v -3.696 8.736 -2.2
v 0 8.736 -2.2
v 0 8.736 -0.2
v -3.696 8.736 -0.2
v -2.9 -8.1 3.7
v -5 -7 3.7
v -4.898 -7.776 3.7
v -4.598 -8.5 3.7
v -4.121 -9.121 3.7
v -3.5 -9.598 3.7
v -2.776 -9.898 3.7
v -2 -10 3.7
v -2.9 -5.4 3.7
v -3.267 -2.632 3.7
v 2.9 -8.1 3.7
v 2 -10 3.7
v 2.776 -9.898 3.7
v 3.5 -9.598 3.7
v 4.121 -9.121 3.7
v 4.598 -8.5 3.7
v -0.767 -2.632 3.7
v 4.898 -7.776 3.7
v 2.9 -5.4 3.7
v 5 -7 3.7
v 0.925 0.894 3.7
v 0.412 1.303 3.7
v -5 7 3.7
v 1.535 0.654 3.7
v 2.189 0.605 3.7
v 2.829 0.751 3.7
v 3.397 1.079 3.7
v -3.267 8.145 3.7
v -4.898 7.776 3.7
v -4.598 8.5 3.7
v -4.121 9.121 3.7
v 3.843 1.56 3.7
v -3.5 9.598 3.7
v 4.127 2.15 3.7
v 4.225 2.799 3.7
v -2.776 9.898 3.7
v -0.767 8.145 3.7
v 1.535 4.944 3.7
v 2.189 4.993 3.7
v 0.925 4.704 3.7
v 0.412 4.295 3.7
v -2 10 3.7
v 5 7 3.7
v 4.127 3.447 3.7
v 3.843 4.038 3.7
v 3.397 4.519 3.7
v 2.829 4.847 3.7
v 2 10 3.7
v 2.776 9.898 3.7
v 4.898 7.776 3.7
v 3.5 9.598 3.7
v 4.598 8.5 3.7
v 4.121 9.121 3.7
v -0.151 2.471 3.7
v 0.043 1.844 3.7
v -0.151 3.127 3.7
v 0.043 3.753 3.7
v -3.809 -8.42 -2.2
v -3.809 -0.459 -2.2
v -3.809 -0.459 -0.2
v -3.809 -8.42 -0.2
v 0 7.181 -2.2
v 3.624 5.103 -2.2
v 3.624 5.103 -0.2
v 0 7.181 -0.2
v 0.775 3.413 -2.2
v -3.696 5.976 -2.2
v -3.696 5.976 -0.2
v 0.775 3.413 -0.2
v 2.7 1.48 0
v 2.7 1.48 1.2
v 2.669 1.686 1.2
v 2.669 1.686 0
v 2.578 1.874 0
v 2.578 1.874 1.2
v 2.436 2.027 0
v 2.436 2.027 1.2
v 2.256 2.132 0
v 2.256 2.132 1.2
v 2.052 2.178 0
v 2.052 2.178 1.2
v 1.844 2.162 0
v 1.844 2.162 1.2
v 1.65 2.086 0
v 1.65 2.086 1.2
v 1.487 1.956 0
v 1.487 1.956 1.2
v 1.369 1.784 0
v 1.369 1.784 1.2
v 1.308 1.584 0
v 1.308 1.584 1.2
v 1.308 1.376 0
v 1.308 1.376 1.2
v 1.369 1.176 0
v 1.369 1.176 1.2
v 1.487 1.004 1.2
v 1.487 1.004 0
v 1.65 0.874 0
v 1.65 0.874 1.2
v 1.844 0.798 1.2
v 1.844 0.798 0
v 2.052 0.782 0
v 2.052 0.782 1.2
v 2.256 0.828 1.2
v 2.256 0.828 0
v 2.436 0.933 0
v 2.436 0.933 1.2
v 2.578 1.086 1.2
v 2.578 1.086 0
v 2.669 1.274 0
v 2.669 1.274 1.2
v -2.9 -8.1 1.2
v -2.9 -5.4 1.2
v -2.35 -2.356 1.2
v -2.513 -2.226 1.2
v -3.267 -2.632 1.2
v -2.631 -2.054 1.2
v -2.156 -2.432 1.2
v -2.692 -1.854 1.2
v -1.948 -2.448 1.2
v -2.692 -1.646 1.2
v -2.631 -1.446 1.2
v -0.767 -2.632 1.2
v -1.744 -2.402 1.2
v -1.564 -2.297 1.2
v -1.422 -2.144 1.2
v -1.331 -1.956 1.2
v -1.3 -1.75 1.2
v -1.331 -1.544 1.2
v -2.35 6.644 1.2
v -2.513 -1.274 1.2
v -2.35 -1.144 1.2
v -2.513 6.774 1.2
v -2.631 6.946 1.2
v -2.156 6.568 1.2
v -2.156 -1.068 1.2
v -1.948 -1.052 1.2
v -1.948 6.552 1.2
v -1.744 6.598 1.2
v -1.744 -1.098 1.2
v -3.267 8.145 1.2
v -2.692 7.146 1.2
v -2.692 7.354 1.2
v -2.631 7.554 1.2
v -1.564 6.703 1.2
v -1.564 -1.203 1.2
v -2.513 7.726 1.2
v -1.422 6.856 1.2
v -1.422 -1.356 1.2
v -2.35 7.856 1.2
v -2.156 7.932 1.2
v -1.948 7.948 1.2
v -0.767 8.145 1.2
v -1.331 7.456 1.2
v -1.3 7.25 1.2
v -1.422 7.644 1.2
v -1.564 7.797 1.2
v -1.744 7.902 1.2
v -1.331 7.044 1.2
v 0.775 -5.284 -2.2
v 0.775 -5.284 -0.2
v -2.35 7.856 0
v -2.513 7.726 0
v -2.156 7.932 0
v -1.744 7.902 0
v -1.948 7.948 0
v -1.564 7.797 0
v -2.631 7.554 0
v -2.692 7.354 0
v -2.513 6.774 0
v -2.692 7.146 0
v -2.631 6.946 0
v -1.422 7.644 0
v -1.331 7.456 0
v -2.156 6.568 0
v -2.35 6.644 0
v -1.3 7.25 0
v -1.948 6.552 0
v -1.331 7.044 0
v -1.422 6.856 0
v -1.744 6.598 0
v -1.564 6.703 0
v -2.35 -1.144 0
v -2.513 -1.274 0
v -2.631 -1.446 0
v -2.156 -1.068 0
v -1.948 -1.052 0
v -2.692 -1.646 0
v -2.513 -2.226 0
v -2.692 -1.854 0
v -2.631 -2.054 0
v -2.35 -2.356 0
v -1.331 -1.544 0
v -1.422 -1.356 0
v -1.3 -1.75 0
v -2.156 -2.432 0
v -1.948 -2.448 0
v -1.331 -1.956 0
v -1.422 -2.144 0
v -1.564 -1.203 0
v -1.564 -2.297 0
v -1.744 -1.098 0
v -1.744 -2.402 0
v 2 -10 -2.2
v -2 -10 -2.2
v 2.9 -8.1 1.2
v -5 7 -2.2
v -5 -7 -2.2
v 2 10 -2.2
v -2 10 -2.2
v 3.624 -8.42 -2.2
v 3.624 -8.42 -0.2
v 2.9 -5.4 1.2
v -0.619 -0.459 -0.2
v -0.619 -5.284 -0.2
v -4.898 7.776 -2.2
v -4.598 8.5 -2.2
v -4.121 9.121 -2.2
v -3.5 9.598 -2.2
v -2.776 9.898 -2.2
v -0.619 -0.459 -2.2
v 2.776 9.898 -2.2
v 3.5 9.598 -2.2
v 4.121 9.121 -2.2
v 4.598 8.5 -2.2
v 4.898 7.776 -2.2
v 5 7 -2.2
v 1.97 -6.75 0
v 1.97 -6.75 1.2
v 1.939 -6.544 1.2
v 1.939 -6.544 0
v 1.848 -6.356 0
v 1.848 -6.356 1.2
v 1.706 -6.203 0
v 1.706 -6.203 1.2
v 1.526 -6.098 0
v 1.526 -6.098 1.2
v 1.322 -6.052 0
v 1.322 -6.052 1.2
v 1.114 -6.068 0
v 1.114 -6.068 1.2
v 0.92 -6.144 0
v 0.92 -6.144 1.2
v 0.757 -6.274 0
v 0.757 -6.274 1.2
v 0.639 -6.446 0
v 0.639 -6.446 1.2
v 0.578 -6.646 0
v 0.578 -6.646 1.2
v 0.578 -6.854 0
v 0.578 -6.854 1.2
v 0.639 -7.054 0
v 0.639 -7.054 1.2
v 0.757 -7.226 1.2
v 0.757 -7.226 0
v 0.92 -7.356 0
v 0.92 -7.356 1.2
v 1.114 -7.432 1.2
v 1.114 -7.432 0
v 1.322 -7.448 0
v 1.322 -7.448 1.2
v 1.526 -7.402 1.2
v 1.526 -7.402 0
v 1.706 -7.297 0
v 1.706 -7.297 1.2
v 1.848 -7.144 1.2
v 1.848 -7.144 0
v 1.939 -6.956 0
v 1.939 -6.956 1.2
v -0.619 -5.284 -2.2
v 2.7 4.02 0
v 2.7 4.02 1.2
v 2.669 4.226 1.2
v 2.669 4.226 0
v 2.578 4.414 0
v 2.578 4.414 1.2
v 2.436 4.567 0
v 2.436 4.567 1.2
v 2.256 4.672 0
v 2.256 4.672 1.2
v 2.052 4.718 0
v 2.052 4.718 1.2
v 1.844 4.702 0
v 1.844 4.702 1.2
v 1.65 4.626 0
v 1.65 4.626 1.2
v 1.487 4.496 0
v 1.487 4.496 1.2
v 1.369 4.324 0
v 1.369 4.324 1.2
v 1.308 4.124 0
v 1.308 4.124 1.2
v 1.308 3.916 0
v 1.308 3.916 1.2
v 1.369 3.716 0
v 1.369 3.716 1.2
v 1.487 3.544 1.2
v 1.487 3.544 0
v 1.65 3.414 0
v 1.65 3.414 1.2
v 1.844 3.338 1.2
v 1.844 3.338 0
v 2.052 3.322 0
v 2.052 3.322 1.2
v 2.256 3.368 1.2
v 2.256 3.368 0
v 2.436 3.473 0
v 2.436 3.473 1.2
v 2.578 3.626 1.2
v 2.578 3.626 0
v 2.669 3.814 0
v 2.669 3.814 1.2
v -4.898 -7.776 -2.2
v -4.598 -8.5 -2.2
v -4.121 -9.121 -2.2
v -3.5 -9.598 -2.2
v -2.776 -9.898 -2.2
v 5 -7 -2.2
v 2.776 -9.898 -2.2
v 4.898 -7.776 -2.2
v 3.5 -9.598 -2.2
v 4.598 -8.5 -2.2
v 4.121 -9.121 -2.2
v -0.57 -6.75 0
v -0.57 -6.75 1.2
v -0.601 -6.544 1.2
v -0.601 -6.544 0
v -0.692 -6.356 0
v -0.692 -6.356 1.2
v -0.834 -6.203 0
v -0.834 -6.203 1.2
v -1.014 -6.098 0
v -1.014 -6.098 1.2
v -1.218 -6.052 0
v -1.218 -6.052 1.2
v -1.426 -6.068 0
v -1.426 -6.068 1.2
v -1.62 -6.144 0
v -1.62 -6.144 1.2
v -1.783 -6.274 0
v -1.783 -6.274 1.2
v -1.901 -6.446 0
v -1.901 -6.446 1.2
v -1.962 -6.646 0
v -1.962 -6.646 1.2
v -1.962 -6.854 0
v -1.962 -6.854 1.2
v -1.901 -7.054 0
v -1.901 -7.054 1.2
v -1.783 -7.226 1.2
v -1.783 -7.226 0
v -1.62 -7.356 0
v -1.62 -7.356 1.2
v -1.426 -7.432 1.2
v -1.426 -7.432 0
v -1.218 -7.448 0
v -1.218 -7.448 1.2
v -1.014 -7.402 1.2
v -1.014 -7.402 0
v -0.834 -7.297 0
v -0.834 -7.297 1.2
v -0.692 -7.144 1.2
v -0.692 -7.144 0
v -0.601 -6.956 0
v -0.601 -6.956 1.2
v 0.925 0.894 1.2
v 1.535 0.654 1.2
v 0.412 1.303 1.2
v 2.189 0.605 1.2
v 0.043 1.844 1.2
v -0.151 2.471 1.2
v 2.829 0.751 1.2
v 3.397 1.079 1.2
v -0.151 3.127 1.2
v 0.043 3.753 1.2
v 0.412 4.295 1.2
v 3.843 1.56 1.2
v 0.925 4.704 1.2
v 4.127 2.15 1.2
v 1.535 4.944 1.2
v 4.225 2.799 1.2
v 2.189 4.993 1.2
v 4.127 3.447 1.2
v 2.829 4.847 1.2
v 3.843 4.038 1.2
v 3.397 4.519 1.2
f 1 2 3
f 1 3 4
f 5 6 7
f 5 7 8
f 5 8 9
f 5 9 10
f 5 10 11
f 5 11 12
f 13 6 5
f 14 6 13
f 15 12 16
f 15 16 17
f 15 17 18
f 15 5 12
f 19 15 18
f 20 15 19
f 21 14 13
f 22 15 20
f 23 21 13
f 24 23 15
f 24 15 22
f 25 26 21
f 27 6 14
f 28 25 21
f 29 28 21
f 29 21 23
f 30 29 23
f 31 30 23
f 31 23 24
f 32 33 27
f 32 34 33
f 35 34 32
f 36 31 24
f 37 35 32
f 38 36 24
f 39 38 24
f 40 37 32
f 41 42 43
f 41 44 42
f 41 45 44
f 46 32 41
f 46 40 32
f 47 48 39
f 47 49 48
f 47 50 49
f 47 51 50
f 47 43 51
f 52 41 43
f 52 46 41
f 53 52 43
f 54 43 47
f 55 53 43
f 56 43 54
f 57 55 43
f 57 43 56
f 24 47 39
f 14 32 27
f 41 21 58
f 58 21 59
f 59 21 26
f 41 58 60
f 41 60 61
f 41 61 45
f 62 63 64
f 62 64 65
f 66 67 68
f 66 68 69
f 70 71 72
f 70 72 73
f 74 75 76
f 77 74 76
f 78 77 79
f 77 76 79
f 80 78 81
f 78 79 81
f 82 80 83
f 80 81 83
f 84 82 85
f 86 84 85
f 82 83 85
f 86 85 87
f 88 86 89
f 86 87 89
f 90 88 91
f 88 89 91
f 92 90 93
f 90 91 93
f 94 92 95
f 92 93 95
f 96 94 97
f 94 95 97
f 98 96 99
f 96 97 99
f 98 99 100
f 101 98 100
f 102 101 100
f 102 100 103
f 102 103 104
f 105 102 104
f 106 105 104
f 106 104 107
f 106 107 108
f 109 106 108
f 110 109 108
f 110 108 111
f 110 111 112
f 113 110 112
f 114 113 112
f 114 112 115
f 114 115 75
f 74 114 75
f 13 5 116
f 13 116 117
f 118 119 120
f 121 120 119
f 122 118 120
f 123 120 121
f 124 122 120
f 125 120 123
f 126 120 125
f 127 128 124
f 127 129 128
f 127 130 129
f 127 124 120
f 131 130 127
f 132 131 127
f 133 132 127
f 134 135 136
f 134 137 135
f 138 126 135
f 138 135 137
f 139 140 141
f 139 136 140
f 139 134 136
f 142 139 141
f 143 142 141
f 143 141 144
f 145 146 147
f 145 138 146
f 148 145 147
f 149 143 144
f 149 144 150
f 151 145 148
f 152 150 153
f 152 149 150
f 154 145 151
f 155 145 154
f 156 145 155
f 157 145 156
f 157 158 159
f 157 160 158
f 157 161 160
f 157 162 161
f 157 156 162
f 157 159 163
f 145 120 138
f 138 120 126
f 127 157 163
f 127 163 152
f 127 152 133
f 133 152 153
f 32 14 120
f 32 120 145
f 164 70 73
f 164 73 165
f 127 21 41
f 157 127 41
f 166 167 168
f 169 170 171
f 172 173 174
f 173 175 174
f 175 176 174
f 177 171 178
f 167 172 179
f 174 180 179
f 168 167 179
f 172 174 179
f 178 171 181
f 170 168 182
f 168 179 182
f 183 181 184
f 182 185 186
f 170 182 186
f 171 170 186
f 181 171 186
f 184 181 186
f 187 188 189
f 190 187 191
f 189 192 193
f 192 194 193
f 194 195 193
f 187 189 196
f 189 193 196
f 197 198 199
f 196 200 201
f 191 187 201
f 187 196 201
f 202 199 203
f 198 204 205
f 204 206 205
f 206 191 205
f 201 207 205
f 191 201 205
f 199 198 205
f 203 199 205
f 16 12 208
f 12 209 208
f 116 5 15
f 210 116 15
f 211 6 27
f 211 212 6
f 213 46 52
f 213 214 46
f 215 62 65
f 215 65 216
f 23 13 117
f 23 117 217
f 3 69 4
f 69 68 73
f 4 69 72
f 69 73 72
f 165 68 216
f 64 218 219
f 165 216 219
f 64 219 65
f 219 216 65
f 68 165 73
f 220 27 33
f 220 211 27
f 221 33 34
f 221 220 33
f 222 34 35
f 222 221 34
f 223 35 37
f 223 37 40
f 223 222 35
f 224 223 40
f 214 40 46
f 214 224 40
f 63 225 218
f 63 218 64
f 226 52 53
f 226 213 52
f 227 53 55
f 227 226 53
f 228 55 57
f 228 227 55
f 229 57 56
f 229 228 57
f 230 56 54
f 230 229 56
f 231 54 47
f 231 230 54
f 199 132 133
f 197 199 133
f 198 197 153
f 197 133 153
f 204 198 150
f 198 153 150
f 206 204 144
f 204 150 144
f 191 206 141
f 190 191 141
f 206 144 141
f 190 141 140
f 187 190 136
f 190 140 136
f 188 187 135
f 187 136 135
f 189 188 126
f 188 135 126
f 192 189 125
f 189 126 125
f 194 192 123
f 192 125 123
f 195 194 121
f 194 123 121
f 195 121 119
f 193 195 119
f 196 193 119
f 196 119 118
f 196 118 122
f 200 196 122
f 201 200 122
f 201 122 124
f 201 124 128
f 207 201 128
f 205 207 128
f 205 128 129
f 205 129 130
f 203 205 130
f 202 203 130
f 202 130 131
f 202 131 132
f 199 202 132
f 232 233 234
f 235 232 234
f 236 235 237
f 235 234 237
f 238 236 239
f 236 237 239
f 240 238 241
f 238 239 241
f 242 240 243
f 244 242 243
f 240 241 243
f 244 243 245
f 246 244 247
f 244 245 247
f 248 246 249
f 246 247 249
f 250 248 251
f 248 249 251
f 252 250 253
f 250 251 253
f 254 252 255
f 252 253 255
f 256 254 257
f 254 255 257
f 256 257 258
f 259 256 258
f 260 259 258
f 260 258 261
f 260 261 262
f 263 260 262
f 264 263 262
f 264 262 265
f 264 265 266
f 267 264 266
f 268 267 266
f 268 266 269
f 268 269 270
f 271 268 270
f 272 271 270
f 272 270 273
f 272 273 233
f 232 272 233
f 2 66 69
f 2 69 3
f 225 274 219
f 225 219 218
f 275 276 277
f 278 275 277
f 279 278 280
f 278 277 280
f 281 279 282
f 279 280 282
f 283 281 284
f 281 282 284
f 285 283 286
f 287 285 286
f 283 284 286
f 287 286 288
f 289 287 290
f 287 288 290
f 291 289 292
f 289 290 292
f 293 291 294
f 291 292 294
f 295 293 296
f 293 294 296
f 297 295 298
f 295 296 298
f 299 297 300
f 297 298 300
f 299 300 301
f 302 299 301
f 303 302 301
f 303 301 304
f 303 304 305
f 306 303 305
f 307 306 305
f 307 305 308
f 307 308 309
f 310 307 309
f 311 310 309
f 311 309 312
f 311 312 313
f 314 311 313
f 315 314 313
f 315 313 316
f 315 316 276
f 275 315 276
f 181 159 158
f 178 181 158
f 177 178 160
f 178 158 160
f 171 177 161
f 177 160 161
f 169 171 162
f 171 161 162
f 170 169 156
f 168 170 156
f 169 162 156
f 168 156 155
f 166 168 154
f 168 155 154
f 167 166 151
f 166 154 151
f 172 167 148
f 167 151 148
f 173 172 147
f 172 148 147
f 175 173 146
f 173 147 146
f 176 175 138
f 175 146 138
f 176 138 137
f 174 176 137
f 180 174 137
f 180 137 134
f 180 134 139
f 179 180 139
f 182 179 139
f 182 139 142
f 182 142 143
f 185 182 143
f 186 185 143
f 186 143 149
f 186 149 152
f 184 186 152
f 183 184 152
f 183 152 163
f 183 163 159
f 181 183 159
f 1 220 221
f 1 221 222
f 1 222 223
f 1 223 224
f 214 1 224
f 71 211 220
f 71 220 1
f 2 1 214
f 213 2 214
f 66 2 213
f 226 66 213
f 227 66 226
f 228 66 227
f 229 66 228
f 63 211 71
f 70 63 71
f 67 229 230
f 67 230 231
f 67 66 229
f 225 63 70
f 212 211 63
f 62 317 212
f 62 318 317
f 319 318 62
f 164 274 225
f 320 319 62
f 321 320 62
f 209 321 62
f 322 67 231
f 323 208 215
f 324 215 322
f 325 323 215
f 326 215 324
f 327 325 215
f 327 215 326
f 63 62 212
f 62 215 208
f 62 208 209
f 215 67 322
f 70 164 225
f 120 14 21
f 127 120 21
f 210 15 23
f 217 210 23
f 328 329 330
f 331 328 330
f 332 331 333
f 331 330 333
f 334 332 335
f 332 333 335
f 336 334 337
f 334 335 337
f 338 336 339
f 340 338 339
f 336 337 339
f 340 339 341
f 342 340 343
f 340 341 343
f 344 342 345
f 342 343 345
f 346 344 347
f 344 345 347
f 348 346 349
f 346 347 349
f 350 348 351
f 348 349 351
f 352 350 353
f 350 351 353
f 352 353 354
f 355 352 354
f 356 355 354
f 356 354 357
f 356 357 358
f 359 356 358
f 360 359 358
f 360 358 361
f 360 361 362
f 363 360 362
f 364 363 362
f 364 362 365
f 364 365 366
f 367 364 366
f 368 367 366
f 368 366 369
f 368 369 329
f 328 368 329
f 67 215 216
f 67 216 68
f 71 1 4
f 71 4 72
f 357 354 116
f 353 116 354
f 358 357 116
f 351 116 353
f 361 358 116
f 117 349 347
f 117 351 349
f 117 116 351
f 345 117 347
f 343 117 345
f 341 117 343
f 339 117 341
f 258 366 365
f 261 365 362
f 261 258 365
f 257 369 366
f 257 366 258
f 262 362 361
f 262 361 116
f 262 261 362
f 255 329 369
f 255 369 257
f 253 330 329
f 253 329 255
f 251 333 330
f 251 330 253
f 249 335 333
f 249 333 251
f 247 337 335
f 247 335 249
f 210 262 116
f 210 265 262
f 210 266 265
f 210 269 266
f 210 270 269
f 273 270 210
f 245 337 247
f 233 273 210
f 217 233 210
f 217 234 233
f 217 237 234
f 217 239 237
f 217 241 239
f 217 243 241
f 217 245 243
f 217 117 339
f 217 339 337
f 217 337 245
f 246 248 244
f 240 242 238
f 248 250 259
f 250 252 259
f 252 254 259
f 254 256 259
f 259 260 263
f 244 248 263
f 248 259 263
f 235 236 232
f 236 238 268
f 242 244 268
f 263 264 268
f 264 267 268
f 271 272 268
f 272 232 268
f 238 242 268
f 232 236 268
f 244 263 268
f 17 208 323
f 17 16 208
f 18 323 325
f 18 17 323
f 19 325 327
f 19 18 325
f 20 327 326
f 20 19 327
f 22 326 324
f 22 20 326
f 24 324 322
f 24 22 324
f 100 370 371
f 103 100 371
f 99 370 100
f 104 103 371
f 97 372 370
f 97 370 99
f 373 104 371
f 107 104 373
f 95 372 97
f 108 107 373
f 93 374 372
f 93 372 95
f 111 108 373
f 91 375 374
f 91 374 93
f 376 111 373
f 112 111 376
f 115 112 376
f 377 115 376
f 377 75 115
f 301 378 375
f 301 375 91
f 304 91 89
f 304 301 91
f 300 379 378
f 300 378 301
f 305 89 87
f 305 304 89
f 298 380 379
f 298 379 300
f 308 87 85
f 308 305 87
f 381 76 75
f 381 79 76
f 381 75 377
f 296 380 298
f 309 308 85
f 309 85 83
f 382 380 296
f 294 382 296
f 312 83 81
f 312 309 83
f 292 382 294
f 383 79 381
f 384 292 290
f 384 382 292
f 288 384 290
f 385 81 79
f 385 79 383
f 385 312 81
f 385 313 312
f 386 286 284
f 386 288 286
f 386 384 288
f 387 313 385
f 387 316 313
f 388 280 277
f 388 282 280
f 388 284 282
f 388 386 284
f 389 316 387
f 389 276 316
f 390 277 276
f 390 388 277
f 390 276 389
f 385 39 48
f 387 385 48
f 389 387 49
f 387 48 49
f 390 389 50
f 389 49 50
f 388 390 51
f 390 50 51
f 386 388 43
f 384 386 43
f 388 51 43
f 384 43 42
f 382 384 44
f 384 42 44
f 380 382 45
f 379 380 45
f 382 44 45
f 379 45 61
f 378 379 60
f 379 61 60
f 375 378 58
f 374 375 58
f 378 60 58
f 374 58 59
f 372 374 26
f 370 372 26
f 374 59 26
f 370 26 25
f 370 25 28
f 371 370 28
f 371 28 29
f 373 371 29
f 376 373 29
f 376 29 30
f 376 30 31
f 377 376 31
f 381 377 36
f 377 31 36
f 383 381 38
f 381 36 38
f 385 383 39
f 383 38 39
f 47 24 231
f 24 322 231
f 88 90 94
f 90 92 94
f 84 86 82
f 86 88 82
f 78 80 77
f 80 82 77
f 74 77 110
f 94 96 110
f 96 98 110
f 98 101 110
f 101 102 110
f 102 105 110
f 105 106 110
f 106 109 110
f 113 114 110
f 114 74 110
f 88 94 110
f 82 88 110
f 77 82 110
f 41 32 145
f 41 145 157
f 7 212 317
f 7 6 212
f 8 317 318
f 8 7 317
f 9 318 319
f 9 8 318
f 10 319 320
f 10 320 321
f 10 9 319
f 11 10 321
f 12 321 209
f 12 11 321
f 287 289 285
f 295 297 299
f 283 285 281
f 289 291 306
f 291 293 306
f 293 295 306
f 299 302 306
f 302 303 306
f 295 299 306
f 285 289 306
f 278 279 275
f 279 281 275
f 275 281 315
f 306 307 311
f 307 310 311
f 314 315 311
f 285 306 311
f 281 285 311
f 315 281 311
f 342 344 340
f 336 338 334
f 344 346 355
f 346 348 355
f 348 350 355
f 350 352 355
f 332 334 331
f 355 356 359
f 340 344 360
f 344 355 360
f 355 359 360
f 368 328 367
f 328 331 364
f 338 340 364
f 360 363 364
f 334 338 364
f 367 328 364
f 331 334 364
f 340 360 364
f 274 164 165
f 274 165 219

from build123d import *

# Parameters (mm, degrees)
SKETCH010_W     = 10
SKETCH010_H     = 20
PAD004_DEPTH    = 1.2
SKETCH011_R     = 0.7
POCKET004_DEPTH = 1.201
SKETCH012_W     = 10
SKETCH012_H     = 20
PAD005_DEPTH    = 0.2
SKETCH014_W     = 10
SKETCH014_H     = 20
PAD006_DEPTH    = 2
POCKET005_DEPTH = 2
SKETCH015_W     = 10
SKETCH015_H     = 20
PAD007_DEPTH    = 2.5
SKETCH016_R     = 2.2
SKETCH016_W     = 5.8
SKETCH016_H     = 2.7
SKETCH016_W_2   = 2.5
SKETCH016_H_2   = 10.776226
POCKET006_DEPTH = 2.5
FILLET_R        = 3


with BuildPart() as part:
    # Sketch010 → Pad004 (new body)
    with BuildSketch(Plane.XY):
        Rectangle(SKETCH010_W, SKETCH010_H)
    extrude(amount=PAD004_DEPTH)

    # Sketch011 → Pocket004 (cut, through all)
    with BuildSketch(Plane.XY.offset(1.2)):
        with Locations((-1.27, -6.75)):
            Circle(SKETCH011_R)
        with Locations((1.27, -6.75)):
            Circle(SKETCH011_R)
        with Locations((-2, 7.25)):
            Circle(SKETCH011_R)
        with Locations((-2, -1.75)):
            Circle(SKETCH011_R)
        with Locations((2, 4.02)):
            Circle(SKETCH011_R)
        with Locations((2, 1.48)):
            Circle(SKETCH011_R)
    extrude(amount=-POCKET004_DEPTH, mode=Mode.SUBTRACT)

    # Sketch012 → Pad005 (new body)
    with BuildSketch(Plane(origin=(0, 0, 0), x_dir=(1, 0, 0), z_dir=(0, 0, -1))):
        Rectangle(SKETCH012_W, SKETCH012_H)
    extrude(amount=PAD005_DEPTH)

    # Sketch014 → Pad006 (new body)
    with BuildSketch(Plane(origin=(0, 0, -0.2), x_dir=(1, 0, 0), z_dir=(0, 0, -1))):
        Rectangle(SKETCH014_W, SKETCH014_H)
    extrude(amount=PAD006_DEPTH)

    # Sketch013 → Pocket005 (cut)
    with BuildSketch(Plane(origin=(0, 0, -2.2), x_dir=(1, 0, 0), z_dir=(0, 0, -1))):
        Polygon((-3.80896, 8.420167), (3.62375, 8.420167), (3.62375, -5.103398), (0, -7.181223), (0, -8.736001), (-3.696102, -8.736001), (-3.696102, -5.976334), (0.775065, -3.412608), (0.775065, 5.283805), (-0.618984, 5.283805), (-0.618984, 0.458633), (-3.80896, 0.458633), align=None)
    extrude(amount=-POCKET005_DEPTH, mode=Mode.SUBTRACT)

    # Sketch015 → Pad007 (new body)
    with BuildSketch(Plane.XY.offset(1.2)):
        Rectangle(SKETCH015_W, SKETCH015_H)
    extrude(amount=PAD007_DEPTH)

    # Sketch016 → Pocket006 (cut)
    with BuildSketch(Plane.XY.offset(3.7)):
        with Locations((2.024904, 2.79891)):
            Circle(SKETCH016_R)
        with Locations((0, -6.75)):
            Rectangle(SKETCH016_W, SKETCH016_H)
        with Locations((-2.017145, 2.756578)):
            Rectangle(SKETCH016_W_2, SKETCH016_H_2)
    extrude(amount=-POCKET006_DEPTH, mode=Mode.SUBTRACT)

    # Fillet
    fillet_edges = [part.edges().sort_by_distance(p)[0] for p in [
        (5, -10, 0.75),
        (-5, -10, 0.75),
        (5, 10, 0.75),
        (-5, 10, 0.75),
    ]]
    fillet(fillet_edges, radius=FILLET_R)


solid = part.part
